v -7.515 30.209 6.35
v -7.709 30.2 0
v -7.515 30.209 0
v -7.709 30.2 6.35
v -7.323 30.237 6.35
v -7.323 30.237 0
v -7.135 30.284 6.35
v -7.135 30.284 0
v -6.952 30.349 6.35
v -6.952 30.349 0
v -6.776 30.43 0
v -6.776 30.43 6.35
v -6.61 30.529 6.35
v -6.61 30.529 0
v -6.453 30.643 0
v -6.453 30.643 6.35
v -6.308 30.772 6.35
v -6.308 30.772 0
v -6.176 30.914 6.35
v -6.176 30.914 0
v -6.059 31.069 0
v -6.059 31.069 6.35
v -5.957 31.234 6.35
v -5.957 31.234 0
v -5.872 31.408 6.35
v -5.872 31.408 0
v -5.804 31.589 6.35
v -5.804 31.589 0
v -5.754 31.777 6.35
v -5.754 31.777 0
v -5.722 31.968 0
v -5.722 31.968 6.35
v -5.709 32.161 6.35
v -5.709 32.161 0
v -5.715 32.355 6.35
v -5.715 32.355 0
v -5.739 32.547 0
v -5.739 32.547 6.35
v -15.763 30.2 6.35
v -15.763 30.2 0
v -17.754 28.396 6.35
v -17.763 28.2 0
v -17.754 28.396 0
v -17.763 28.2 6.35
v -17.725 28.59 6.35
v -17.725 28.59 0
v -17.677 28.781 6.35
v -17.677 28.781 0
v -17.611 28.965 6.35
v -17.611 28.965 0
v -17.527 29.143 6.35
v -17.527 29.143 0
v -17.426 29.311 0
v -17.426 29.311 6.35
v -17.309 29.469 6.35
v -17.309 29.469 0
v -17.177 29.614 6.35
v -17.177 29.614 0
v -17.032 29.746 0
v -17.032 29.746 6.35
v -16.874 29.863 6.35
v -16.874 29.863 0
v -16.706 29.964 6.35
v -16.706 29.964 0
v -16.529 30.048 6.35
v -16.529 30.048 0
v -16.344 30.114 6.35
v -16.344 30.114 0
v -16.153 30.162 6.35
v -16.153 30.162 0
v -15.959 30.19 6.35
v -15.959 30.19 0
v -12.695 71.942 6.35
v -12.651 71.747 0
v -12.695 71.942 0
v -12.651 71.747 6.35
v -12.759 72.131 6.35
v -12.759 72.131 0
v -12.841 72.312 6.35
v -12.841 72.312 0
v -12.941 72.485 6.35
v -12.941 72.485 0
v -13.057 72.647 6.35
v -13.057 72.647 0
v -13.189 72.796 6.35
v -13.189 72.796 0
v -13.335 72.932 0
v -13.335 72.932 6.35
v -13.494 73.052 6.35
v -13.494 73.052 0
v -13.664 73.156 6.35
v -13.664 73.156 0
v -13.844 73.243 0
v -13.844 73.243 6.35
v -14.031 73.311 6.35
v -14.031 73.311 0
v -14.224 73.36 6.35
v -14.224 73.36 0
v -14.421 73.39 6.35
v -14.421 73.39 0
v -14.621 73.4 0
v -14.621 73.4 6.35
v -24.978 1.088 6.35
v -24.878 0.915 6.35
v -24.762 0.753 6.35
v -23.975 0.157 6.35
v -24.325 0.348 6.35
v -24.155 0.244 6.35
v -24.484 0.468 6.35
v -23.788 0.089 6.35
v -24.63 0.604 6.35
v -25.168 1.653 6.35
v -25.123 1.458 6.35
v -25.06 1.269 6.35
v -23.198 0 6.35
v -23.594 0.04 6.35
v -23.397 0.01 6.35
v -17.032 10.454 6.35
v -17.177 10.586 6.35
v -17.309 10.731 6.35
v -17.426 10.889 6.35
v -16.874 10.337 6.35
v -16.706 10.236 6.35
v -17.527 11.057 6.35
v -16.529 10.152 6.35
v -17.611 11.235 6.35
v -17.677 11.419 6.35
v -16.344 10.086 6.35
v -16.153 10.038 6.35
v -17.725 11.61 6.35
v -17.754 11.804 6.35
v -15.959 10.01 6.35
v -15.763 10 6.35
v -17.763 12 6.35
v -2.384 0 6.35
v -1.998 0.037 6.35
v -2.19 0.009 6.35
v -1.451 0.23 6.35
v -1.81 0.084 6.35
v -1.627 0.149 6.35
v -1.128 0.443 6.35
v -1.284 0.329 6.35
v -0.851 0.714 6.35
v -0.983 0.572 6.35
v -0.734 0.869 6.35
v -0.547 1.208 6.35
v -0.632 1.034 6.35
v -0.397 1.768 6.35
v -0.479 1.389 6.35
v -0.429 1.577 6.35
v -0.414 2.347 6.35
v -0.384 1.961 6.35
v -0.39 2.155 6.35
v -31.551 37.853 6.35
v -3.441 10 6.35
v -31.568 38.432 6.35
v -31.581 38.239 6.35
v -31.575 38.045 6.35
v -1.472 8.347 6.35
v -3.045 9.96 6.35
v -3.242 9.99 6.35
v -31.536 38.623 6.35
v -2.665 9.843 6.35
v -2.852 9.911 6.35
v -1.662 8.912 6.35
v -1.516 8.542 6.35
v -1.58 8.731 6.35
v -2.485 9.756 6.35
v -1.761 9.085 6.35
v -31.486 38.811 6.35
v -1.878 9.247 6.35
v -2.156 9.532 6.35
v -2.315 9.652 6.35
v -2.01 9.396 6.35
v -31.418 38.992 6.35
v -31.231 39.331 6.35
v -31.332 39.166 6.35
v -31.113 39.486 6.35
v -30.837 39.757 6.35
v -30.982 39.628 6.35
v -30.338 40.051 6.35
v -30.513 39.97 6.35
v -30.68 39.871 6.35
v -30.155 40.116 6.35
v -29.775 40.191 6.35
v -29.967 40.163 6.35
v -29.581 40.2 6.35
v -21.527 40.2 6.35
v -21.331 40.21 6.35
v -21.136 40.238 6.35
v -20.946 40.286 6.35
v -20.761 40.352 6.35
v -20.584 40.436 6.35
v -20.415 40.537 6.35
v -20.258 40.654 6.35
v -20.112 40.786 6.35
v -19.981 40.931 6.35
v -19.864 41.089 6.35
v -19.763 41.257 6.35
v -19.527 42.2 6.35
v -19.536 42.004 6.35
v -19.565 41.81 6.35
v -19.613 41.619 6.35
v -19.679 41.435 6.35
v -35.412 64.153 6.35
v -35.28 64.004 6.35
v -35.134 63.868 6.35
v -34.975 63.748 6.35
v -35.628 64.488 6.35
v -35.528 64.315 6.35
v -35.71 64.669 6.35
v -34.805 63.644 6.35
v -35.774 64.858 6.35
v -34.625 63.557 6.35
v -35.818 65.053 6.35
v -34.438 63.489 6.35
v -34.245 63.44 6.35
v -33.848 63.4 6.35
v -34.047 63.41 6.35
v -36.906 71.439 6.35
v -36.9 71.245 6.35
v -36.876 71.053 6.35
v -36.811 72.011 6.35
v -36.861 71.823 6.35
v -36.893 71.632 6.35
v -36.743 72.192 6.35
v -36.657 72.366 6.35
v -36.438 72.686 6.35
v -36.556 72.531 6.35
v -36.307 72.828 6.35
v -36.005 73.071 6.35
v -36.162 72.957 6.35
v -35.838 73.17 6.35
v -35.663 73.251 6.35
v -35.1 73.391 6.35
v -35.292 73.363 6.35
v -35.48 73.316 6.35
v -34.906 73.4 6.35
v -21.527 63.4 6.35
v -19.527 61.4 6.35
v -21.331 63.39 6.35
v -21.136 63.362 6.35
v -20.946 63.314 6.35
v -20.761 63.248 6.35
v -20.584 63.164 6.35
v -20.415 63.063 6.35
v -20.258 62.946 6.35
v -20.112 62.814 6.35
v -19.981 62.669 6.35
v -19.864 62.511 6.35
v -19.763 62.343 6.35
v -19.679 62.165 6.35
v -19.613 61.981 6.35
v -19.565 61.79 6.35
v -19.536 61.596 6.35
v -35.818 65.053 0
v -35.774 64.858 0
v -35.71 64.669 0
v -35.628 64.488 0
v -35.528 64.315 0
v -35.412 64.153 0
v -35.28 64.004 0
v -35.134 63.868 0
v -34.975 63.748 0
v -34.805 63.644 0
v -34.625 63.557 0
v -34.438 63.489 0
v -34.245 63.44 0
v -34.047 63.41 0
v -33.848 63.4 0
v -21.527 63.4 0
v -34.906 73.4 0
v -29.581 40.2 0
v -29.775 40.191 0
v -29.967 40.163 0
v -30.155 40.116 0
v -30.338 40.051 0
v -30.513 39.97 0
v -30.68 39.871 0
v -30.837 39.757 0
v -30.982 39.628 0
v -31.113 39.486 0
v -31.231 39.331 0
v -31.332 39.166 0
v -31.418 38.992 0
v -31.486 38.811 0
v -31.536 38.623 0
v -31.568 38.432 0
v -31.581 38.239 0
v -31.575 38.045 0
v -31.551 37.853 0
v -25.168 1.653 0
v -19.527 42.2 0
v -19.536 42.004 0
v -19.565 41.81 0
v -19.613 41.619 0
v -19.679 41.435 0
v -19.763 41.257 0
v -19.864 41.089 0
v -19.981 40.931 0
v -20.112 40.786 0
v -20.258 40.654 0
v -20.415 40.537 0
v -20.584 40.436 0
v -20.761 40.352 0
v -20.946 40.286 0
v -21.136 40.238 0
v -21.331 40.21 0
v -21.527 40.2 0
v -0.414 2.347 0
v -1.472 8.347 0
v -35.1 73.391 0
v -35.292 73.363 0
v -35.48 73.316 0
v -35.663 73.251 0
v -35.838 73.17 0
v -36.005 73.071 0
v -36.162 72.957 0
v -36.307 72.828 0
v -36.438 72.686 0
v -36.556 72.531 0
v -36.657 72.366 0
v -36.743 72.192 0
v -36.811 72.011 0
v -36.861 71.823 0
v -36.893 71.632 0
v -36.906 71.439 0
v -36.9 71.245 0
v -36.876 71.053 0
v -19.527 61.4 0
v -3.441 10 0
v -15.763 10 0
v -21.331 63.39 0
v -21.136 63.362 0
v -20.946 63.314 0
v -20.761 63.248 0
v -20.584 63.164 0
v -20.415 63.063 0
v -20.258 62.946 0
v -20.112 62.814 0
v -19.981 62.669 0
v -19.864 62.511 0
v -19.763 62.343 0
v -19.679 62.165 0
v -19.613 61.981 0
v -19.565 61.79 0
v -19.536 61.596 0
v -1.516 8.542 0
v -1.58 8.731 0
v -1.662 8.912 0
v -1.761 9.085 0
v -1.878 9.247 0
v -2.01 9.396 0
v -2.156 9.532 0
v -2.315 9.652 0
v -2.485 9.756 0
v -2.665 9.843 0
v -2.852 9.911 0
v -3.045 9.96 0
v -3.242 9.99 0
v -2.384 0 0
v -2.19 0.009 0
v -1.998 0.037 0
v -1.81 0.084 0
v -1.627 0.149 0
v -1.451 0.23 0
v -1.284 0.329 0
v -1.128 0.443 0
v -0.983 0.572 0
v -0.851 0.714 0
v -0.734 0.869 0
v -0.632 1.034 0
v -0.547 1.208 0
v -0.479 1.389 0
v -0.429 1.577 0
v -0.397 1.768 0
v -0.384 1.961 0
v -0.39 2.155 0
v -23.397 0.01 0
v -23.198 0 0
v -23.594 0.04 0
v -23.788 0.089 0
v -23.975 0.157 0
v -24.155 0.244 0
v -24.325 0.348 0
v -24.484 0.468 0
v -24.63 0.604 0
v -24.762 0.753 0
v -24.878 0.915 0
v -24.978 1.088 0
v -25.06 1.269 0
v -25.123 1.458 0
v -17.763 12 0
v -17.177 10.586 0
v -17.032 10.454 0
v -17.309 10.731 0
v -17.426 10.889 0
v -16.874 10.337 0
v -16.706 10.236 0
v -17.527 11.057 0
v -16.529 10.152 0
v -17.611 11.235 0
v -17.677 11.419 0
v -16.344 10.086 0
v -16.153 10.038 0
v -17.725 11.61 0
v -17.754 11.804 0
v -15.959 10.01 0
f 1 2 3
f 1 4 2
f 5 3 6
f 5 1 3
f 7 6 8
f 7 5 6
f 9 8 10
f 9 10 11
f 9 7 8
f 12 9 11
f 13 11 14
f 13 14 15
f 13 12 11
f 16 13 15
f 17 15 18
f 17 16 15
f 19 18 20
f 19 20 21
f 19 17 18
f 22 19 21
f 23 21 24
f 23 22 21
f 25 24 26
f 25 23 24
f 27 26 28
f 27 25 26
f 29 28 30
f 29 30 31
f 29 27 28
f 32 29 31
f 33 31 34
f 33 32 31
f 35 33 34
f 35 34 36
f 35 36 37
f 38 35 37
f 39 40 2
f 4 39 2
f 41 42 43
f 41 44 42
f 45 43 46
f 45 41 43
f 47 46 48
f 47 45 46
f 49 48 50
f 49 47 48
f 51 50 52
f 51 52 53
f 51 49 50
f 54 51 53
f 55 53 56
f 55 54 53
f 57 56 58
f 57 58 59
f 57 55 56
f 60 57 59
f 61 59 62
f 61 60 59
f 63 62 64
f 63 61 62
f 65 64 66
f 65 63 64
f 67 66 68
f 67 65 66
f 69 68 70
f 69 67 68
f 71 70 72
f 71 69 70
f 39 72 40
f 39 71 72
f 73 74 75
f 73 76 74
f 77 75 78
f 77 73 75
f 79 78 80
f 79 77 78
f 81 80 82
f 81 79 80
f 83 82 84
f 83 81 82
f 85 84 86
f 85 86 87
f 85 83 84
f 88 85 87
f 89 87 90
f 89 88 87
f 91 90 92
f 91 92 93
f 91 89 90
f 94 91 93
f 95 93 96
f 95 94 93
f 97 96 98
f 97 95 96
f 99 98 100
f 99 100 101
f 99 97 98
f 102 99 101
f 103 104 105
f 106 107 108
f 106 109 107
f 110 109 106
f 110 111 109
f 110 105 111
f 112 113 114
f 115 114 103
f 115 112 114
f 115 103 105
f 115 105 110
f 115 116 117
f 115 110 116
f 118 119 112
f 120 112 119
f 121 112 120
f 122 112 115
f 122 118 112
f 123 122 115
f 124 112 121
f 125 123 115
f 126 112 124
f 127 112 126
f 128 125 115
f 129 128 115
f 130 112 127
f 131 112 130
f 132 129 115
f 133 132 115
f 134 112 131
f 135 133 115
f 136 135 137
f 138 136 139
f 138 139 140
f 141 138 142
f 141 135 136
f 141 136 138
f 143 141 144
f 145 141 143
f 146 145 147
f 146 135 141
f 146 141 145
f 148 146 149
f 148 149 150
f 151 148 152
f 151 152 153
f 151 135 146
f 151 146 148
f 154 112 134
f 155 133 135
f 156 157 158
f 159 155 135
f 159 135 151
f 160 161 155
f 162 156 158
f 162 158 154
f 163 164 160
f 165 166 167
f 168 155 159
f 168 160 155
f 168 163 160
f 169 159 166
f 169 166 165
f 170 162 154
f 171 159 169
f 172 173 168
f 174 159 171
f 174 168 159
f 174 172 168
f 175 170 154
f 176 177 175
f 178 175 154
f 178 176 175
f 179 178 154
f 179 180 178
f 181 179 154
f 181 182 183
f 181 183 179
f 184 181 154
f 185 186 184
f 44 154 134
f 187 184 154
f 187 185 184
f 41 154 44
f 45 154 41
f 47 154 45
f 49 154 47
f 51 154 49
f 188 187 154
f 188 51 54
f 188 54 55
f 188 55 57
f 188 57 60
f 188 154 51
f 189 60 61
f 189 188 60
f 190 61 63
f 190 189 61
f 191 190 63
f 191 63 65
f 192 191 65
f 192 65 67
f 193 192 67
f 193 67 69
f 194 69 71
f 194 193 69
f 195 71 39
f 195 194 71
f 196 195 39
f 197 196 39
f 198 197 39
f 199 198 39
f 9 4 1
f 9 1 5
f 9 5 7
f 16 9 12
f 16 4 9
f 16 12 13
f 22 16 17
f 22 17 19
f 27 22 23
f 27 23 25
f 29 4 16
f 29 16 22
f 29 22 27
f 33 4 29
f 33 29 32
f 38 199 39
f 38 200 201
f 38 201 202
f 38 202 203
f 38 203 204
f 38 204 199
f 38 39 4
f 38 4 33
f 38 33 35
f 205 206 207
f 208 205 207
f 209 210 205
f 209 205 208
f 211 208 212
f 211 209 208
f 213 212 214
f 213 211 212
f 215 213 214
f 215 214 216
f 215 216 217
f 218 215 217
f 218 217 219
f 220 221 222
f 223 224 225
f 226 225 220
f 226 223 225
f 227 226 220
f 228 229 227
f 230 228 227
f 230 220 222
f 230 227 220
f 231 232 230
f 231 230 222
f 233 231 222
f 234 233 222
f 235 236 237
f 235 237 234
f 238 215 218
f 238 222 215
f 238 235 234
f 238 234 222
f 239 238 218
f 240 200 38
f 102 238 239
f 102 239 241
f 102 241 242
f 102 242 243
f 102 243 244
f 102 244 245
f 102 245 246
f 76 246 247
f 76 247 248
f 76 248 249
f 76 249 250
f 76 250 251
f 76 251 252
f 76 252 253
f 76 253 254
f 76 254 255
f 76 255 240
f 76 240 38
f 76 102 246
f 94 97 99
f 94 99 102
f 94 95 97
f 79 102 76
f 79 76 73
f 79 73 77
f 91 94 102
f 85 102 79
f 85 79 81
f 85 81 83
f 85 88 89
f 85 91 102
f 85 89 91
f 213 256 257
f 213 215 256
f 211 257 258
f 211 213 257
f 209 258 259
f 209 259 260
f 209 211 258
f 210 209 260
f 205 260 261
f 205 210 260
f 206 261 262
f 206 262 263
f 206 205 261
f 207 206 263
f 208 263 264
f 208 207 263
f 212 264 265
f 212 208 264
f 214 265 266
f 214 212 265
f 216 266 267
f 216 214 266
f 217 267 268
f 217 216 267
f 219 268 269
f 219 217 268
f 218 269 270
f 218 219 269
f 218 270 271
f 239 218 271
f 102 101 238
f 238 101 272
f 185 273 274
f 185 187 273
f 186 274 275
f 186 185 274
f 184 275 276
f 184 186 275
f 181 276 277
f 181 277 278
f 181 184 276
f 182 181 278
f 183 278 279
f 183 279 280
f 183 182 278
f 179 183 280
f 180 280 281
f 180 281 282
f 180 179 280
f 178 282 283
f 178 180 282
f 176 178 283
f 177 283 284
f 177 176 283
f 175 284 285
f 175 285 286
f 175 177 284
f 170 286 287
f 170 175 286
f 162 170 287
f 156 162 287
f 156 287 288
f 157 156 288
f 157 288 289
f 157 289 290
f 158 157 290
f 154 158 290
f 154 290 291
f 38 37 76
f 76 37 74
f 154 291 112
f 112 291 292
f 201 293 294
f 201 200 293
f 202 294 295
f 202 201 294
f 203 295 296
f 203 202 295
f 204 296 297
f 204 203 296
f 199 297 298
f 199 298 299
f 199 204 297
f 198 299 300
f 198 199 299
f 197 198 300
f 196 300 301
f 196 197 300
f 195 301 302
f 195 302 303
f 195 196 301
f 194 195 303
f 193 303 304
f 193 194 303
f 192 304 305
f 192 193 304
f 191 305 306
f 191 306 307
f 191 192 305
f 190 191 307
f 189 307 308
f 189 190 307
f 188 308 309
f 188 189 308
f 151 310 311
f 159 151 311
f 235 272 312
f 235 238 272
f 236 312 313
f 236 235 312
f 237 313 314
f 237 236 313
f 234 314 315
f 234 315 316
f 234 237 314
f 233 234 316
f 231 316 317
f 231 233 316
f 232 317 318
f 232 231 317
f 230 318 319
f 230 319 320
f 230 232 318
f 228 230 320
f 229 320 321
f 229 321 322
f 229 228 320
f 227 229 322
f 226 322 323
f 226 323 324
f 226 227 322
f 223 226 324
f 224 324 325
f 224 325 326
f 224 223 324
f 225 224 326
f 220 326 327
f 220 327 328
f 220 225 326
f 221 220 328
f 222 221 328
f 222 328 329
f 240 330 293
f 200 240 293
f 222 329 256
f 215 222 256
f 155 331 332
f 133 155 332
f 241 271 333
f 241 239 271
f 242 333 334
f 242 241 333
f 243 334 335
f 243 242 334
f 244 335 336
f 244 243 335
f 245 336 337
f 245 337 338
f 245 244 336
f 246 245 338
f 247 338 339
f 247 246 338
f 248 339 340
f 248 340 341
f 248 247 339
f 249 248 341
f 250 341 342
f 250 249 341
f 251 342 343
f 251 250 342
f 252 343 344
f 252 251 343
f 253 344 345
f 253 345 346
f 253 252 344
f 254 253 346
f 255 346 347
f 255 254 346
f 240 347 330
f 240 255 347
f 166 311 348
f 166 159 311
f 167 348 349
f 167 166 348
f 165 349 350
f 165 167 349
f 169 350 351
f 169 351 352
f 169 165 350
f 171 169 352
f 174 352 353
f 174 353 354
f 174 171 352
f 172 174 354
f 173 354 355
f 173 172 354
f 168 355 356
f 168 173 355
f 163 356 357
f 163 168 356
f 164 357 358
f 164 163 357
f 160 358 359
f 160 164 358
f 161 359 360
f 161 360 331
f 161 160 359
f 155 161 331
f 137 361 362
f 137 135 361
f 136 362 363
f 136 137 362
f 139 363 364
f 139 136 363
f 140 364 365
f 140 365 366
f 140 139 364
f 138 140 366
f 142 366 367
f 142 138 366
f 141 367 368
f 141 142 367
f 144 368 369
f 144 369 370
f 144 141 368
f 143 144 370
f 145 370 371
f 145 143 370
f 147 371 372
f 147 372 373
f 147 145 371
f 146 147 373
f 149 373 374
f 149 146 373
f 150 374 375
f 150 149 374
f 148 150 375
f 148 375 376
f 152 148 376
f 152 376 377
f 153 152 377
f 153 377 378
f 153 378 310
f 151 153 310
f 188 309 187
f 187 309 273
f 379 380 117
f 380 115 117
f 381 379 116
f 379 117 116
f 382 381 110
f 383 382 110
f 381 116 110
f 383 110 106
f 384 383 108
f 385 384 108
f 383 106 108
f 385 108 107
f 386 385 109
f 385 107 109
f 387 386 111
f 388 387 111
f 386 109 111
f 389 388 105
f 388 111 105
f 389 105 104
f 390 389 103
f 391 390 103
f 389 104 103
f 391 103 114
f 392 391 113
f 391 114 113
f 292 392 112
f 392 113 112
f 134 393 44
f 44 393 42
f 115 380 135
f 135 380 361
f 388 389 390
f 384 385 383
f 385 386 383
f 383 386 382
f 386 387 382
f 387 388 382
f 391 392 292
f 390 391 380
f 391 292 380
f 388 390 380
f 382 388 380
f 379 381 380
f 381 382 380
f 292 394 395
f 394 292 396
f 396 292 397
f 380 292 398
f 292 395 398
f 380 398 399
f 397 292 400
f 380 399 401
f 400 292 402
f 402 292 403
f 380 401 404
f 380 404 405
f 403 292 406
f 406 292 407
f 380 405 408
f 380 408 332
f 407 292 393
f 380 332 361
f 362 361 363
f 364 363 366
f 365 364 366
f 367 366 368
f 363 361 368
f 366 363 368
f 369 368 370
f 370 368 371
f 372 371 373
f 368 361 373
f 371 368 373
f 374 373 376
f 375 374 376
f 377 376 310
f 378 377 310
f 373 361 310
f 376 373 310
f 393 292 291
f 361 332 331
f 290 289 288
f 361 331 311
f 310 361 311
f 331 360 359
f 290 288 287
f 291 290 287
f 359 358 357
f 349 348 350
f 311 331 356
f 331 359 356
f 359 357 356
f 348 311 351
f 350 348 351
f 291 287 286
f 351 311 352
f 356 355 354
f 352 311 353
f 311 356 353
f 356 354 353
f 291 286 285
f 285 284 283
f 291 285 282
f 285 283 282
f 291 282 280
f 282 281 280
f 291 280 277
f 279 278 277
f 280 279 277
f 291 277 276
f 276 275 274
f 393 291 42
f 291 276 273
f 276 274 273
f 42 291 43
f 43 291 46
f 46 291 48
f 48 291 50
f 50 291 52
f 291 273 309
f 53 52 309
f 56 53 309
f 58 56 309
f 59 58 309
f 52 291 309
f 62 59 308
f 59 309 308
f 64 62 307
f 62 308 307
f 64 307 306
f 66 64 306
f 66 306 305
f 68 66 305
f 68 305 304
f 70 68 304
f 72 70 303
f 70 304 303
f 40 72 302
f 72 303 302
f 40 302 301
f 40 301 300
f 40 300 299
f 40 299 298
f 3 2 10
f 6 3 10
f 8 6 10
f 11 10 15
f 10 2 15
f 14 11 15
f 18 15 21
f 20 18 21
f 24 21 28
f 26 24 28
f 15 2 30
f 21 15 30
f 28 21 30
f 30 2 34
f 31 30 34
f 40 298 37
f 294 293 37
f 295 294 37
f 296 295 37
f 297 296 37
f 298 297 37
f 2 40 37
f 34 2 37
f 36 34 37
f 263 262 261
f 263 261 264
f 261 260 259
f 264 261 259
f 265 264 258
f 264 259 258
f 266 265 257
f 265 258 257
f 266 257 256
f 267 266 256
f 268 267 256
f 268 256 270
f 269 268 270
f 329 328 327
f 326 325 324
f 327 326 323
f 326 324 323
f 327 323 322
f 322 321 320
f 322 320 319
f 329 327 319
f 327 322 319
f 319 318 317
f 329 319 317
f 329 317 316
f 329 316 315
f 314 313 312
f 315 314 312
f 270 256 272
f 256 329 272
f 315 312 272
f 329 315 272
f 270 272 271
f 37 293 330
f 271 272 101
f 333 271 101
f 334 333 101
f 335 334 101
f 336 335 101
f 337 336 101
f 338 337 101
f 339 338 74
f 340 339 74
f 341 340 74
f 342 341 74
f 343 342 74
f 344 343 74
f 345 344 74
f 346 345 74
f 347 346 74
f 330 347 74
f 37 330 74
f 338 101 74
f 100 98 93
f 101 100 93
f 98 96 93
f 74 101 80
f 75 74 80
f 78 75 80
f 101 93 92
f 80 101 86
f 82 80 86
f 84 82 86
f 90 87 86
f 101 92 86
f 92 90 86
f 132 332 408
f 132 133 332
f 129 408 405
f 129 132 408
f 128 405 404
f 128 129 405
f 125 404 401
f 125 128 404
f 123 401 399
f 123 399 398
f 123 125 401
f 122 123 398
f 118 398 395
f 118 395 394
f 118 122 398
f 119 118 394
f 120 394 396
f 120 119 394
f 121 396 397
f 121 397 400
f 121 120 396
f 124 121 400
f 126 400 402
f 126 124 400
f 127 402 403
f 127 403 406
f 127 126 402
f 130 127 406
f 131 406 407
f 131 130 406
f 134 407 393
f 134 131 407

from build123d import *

# Parameters (mm, degrees)
F1_DEPTH = 6.35
F2_R     = 2


with BuildPart() as f1:
    # F0 (on Top) → F1 (new body)
    with BuildSketch(Plane.XY):
        Polygon((-24.87639, 0), (0, 0), (-1.76327, 10), (-17.76327, 10), (-17.76327, 30.2), (-5.325075, 30.2), (-12.9424, 73.4), (-37.289809, 73.4), (-35.52654, 63.4), (-19.52654, 63.4), (-19.52654, 40.2), (-31.964735, 40.2), align=None)
    extrude(amount=F1_DEPTH)

    # F2
    f2_edges = [f1.edges().sort_by_distance(p)[0] for p in [
        (-37.289809, 73.4, 3.175),
        (-35.52654, 63.4, 3.175),
        (-19.52654, 63.4, 3.175),
        (-31.964735, 40.2, 3.175),
        (-19.52654, 40.2, 3.175),
        (-12.9424, 73.4, 3.175),
        (-5.325075, 30.2, 3.175),
        (-17.76327, 30.2, 3.175),
        (-17.76327, 10, 3.175),
        (-1.76327, 10, 3.175),
        (0, 0, 3.175),
        (-24.87639, 0, 3.175),
    ]]
    fillet(f2_edges, radius=F2_R)


solid = f1.part
